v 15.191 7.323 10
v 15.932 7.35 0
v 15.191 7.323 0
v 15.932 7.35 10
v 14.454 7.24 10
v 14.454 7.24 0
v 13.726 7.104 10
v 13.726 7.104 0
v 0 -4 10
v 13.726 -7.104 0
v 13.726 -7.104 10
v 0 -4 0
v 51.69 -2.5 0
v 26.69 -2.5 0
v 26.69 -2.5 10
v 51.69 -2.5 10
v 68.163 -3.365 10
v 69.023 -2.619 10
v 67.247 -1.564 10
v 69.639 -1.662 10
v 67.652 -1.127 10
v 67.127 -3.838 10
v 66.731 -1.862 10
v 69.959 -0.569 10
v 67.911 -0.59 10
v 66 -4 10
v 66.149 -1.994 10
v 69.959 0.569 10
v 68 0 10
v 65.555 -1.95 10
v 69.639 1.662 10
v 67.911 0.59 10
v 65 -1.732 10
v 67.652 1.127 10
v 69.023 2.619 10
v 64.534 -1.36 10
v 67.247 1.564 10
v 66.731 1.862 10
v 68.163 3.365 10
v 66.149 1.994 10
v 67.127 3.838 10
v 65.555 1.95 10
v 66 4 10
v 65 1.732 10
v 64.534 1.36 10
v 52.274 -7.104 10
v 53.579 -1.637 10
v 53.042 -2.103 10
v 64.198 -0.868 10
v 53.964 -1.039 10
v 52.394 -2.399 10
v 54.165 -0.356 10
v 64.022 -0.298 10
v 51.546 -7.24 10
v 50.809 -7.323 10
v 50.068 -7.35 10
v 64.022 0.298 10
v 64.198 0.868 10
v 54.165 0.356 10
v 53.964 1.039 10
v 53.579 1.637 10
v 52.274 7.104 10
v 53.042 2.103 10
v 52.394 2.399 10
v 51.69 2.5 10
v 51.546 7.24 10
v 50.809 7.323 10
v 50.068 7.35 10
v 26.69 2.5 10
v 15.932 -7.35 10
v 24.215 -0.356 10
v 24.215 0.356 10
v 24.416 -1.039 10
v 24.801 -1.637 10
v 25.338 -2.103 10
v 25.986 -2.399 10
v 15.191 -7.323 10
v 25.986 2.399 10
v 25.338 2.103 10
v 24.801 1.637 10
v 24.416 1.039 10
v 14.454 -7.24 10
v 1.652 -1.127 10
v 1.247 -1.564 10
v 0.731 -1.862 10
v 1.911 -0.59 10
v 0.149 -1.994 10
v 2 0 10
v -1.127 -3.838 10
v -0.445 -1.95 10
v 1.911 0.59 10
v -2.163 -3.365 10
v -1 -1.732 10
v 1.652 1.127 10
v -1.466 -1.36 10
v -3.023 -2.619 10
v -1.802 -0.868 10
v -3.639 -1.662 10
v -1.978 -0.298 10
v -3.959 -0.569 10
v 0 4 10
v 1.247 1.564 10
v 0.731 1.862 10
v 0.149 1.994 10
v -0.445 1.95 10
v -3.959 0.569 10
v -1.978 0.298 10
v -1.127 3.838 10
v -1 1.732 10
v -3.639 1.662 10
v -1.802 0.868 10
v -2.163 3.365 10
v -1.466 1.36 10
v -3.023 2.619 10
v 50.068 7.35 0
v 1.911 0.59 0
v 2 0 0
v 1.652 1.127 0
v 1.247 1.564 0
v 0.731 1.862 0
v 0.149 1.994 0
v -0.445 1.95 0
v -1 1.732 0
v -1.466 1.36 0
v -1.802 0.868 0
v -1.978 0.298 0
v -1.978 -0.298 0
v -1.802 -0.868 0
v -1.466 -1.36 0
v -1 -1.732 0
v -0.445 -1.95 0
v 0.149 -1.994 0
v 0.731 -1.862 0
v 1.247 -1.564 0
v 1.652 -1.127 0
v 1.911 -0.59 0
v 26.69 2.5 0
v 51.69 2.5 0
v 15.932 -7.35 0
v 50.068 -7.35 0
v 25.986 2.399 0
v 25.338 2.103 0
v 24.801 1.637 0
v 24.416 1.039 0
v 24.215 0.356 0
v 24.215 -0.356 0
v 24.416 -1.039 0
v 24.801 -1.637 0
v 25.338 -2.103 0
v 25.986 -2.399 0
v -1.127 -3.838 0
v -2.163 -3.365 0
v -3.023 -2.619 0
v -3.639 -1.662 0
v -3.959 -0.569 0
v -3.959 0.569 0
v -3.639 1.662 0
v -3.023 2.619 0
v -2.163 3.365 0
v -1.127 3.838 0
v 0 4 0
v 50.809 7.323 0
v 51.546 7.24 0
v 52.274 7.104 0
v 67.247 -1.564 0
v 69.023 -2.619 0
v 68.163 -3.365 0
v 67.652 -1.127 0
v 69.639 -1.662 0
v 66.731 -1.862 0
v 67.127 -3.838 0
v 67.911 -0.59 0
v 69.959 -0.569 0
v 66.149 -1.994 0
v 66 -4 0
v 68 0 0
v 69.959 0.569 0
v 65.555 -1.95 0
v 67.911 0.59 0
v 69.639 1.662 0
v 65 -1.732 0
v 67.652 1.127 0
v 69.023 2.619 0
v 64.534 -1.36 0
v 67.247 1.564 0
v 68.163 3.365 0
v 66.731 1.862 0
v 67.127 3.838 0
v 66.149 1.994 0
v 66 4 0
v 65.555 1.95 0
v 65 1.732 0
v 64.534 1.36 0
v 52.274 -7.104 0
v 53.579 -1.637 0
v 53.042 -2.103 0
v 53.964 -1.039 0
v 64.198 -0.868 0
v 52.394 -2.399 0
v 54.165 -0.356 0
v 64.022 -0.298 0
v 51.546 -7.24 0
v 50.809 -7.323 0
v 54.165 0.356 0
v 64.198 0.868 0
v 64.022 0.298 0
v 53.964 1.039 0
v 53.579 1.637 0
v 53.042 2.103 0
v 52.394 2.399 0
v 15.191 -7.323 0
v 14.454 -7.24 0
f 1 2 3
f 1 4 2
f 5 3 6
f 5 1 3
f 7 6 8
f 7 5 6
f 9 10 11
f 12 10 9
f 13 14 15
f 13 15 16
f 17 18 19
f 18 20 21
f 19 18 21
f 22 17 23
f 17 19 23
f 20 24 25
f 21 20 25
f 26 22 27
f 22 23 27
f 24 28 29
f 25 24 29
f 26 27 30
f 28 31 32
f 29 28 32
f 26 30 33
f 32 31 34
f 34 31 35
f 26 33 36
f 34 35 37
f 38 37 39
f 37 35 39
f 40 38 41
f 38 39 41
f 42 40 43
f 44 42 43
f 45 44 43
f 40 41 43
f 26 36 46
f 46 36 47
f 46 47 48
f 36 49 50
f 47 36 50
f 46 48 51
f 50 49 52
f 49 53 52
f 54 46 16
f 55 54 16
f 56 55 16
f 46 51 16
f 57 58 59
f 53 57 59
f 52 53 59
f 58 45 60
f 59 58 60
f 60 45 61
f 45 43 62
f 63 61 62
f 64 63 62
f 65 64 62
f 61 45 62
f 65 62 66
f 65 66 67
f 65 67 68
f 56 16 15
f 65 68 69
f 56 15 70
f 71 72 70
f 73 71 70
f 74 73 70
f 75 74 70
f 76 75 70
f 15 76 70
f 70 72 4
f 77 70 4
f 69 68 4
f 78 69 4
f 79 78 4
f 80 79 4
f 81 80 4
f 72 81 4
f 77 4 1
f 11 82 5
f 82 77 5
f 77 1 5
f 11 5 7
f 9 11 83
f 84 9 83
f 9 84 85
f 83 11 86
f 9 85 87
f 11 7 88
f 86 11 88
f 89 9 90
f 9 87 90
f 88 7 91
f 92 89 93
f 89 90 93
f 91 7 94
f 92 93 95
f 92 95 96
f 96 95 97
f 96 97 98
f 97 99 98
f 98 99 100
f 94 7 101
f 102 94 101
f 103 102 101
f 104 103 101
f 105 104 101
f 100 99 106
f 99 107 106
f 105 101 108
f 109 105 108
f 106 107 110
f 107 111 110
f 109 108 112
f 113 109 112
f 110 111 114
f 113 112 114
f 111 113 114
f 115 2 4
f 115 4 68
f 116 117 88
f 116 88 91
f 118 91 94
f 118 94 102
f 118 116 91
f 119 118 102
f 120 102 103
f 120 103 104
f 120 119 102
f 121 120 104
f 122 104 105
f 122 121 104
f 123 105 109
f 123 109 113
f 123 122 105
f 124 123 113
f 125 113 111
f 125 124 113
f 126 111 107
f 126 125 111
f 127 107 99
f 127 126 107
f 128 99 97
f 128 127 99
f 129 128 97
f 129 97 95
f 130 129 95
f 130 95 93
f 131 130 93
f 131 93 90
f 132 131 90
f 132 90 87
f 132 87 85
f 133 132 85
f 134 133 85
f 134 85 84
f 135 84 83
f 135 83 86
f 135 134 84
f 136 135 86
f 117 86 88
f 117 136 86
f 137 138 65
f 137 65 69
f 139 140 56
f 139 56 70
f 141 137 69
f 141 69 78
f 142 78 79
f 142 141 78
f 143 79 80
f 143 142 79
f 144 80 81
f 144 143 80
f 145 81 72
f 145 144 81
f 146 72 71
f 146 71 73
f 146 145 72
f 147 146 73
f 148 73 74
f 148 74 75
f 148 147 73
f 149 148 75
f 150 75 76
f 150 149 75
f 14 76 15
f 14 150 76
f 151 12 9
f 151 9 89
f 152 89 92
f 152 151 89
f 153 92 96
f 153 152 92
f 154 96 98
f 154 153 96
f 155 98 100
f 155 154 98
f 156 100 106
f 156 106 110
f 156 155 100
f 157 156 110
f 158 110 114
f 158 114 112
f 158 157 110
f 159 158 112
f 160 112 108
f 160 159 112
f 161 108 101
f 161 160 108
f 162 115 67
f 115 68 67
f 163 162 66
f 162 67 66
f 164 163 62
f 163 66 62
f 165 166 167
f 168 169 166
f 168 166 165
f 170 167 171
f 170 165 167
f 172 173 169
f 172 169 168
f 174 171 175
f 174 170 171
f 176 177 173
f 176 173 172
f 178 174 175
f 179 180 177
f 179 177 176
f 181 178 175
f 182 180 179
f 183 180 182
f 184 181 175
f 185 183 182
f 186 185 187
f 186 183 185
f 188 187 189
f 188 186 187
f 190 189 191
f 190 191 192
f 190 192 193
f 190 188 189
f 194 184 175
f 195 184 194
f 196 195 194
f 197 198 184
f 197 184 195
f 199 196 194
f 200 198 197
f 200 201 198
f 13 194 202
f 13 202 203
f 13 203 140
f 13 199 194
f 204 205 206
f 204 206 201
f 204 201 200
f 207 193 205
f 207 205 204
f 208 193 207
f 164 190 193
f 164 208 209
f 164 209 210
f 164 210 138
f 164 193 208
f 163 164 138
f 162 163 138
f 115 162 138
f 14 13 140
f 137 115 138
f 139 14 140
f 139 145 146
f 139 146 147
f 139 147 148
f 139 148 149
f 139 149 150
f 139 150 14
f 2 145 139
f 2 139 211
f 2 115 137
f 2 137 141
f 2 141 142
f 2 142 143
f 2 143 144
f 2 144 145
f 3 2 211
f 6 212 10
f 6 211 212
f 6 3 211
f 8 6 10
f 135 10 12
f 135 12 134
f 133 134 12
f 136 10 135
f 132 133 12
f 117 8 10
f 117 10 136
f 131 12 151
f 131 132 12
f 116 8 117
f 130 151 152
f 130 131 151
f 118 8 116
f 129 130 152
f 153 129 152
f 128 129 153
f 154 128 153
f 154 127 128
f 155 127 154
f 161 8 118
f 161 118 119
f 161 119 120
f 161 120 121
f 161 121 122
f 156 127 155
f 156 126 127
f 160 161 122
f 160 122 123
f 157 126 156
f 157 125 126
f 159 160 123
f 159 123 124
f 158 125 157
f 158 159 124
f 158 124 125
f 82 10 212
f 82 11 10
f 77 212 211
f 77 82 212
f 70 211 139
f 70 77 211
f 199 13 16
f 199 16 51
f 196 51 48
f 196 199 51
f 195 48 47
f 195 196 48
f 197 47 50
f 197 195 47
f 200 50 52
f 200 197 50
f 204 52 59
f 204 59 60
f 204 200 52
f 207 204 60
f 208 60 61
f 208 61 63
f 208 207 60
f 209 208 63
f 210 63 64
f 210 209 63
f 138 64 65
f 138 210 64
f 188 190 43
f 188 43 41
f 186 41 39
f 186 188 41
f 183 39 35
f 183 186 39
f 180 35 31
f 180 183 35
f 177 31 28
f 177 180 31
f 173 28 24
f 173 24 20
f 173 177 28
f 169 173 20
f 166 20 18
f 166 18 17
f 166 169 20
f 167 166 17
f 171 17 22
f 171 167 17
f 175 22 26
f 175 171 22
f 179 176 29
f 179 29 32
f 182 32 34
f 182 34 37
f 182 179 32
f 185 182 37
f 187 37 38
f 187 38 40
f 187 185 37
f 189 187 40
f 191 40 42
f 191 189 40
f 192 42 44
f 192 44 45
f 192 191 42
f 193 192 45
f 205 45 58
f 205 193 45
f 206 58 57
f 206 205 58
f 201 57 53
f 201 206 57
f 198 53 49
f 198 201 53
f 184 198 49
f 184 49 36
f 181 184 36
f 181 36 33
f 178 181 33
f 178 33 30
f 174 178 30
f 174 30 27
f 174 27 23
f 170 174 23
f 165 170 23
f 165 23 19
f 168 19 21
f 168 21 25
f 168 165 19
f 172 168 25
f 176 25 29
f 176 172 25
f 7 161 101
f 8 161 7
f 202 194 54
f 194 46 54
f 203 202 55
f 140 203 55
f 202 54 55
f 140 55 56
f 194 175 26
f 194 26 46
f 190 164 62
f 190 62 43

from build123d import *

# Parameters (mm, degrees)
CROQUIS1_R              = 2
SALIENTE_EXTRUIR1_DEPTH = 10
REDONDEO2_R             = 10
CORTAR_EXTRUIR1_DEPTH   = 10


with BuildPart() as part:
    # Croquis1 → Saliente-Extruir1 (new body)
    with BuildSketch(Plane.XY):
        with BuildLine():
            Line((14.815, 7.35), (51.185, 7.35))
            Line((51.185, 7.35), (66, 4))
            ThreePointArc((66, 4), (70, 0), (66, -4))
            Line((66, -4), (51.185, -7.35))
            Line((51.185, -7.35), (14.815, -7.35))
            Line((14.815, -7.35), (0, -4))
            ThreePointArc((0, -4), (-4, 0), (0, 4))
            Line((0, 4), (14.815, 7.35))
        make_face()
        Circle(CROQUIS1_R, mode=Mode.SUBTRACT)
        with Locations((66, 0)):
            Circle(CROQUIS1_R, mode=Mode.SUBTRACT)
    extrude(amount=SALIENTE_EXTRUIR1_DEPTH)

    # Redondeo2
    redondeo2_edges = [part.edges().sort_by_distance(p)[0] for p in [
        (14.815, 7.35, 5),
        (51.185, 7.35, 5),
        (51.185, -7.35, 5),
        (14.815, -7.35, 5),
    ]]
    fillet(redondeo2_edges, radius=REDONDEO2_R)

    # Croquis2 → Cortar-Extruir1 (cut)
    with BuildSketch(Plane.XY):
        with BuildLine():
            Line((51.69, 2.5), (26.69, 2.5))
            ThreePointArc((26.69, 2.5), (24.19, 0), (26.69, -2.5))
            Line((26.69, -2.5), (51.69, -2.5))
            ThreePointArc((51.69, -2.5), (54.19, 0), (51.69, 2.5))
        make_face()
    extrude(amount=CORTAR_EXTRUIR1_DEPTH, mode=Mode.SUBTRACT)


solid = part.part
